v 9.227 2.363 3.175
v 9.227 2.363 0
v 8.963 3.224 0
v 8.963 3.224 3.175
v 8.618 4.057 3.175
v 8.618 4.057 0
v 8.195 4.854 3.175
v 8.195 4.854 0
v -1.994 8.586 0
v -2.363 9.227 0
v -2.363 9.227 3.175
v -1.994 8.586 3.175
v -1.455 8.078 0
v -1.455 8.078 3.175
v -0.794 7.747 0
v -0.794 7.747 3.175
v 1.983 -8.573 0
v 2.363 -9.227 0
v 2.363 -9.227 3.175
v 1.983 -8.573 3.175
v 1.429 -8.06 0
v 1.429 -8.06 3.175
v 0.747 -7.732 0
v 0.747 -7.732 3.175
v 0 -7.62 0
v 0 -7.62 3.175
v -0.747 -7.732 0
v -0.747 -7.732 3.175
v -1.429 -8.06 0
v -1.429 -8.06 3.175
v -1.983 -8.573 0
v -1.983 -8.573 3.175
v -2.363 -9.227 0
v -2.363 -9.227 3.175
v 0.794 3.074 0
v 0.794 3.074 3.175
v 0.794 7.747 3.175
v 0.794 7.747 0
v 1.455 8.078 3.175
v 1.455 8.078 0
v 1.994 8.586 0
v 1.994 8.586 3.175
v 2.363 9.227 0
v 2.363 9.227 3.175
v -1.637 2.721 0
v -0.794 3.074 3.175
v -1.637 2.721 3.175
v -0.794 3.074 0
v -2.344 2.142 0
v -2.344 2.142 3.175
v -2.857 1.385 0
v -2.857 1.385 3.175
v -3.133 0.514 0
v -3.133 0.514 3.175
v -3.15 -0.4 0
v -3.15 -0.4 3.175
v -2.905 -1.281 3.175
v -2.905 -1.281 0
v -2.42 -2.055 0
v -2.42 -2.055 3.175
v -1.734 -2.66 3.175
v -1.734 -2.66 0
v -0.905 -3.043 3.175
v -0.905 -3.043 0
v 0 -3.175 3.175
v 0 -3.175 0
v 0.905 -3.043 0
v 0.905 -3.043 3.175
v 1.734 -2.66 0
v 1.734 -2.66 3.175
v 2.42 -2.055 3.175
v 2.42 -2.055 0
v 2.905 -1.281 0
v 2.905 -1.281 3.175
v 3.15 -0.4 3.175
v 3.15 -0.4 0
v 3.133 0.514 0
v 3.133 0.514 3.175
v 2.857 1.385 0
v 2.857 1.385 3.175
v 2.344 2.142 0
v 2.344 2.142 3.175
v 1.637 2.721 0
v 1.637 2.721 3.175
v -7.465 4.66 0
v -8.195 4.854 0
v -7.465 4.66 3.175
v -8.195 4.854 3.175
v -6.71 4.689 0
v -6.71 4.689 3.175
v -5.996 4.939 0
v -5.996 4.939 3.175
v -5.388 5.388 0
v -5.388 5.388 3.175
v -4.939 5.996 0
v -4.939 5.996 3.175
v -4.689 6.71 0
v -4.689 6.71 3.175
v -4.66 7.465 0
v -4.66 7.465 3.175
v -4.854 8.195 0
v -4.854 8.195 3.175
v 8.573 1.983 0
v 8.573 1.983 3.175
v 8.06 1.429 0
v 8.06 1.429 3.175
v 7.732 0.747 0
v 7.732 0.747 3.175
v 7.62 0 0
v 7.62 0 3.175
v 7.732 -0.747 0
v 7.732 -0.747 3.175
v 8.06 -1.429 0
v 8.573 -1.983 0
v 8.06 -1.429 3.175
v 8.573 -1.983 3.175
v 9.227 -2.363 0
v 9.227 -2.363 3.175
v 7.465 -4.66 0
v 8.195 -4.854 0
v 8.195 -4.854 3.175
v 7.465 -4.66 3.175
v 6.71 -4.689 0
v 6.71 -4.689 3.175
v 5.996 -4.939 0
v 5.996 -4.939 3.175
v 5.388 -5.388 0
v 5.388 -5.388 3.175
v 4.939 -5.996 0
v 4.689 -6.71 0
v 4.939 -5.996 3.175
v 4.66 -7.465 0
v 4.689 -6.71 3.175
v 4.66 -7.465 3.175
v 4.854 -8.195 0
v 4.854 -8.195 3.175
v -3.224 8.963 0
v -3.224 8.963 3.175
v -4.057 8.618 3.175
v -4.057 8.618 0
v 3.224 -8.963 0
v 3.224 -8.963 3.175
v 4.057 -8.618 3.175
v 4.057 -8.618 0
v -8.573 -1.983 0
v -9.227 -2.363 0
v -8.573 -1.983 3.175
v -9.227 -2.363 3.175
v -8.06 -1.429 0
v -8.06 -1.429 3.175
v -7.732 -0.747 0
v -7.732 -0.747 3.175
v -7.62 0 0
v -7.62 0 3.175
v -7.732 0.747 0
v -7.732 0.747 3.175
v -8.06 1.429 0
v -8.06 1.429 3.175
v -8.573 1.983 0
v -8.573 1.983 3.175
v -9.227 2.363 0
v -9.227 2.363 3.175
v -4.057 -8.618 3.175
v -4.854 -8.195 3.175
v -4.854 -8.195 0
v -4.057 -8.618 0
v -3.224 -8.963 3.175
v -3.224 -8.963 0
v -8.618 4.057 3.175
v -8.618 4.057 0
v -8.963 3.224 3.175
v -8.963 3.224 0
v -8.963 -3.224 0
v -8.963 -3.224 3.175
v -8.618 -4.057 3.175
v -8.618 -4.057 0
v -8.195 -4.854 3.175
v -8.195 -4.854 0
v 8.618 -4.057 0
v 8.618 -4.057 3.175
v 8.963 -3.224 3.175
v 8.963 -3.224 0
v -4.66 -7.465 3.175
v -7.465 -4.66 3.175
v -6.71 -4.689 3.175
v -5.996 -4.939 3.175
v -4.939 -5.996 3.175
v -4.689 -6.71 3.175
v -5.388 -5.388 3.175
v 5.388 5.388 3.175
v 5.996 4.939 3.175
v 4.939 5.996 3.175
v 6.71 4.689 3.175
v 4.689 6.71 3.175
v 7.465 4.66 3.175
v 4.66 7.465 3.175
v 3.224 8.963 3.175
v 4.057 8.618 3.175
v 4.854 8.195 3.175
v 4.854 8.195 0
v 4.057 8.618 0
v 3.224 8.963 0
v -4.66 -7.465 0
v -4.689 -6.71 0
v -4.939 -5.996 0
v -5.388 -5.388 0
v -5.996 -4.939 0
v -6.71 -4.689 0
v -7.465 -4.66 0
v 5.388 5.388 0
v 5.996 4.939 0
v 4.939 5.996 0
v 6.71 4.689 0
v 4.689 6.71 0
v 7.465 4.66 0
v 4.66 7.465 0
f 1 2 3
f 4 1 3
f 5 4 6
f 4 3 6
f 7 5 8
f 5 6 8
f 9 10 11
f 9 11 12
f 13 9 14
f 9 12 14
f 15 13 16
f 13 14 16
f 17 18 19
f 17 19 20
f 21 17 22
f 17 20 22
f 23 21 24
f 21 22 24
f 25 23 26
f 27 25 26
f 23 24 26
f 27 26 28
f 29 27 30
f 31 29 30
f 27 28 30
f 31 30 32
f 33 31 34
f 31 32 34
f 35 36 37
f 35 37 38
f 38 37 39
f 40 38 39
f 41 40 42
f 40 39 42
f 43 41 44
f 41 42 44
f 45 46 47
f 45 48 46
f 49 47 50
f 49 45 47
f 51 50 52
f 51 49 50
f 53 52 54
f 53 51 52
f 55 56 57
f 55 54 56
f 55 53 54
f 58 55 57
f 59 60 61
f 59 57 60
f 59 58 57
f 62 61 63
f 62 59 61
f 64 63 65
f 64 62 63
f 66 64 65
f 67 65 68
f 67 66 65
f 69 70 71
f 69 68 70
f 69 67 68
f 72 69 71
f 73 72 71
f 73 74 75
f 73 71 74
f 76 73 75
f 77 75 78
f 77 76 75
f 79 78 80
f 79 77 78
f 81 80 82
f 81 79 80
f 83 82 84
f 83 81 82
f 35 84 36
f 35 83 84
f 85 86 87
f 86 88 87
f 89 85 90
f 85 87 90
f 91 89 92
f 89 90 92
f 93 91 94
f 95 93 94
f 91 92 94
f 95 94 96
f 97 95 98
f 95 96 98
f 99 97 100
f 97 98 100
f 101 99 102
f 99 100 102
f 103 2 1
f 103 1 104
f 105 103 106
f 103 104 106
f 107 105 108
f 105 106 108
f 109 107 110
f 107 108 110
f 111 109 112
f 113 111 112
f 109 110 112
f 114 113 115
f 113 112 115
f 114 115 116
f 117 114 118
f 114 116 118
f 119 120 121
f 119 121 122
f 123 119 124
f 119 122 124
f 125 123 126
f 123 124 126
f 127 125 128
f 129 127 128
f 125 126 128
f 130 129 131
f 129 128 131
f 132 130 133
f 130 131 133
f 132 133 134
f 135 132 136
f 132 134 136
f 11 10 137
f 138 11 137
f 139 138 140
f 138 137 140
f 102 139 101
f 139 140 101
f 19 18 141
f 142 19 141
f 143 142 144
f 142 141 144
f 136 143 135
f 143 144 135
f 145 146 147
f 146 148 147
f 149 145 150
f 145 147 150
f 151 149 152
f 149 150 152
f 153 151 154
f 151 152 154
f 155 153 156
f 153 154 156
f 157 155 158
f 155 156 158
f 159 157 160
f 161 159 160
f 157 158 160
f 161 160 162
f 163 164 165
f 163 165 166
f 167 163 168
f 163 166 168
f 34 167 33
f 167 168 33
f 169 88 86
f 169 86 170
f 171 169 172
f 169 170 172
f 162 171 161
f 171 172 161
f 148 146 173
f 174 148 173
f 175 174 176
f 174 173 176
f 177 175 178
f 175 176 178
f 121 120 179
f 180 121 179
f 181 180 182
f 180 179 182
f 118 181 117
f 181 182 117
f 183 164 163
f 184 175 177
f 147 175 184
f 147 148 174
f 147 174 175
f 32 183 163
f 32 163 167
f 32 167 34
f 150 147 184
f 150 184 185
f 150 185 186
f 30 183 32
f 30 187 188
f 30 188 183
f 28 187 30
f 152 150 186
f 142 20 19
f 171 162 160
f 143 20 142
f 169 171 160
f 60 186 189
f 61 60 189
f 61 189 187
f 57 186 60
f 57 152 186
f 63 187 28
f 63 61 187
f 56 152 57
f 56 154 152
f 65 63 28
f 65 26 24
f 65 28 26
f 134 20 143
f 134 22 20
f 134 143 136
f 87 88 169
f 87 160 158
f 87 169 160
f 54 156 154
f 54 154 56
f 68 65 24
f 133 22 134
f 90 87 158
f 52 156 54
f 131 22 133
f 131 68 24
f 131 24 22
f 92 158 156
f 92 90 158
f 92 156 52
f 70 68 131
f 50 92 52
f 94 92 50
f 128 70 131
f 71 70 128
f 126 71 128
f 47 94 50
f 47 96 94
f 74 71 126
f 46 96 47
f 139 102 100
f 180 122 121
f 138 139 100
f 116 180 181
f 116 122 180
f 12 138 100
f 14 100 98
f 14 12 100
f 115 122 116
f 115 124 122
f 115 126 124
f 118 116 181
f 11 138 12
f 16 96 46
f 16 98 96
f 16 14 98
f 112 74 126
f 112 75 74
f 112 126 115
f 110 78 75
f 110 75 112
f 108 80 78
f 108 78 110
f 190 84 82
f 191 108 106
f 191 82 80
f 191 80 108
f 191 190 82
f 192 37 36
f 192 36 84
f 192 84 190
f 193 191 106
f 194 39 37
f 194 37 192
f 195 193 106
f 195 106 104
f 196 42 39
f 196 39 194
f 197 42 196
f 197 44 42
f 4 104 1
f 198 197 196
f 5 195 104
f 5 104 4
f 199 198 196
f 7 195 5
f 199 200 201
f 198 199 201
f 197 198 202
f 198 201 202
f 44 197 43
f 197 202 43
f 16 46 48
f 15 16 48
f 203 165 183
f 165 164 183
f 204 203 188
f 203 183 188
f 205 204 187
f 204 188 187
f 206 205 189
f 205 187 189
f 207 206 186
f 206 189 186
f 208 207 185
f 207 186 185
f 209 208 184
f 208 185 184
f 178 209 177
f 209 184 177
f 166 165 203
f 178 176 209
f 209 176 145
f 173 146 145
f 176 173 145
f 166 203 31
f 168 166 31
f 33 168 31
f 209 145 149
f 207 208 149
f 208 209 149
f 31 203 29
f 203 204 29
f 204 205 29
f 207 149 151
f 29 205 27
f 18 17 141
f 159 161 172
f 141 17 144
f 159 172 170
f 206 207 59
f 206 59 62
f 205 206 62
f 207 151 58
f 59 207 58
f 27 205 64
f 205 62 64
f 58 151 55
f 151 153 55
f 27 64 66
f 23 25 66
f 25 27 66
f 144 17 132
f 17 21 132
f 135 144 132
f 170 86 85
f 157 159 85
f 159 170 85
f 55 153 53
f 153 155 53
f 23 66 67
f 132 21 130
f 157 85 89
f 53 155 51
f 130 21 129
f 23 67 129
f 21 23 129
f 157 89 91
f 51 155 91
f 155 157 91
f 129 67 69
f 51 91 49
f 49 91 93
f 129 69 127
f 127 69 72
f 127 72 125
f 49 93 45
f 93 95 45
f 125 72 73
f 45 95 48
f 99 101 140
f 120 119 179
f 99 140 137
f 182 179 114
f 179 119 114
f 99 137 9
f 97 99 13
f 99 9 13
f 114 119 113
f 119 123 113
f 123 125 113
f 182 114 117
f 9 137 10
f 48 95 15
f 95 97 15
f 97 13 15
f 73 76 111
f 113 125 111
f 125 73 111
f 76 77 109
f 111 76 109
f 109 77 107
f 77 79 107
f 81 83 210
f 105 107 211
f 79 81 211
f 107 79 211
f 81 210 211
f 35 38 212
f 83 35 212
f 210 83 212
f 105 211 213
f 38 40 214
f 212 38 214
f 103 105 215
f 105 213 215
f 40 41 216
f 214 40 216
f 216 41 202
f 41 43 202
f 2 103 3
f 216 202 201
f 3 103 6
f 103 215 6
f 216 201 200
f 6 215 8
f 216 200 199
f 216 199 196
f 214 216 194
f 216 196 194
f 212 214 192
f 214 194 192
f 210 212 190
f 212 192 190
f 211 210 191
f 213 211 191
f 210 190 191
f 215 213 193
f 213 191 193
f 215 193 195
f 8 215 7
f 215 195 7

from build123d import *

# Parameters (mm, degrees)
CROQUIS1_R              = 9.525
CROQUIS1_R_2            = 3.175
SALIENTE_EXTRUIR1_DEPTH = 3.175
CROQUIS2_R              = 2.54
CORTAR_EXTRUIR1_DEPTH   = 3.175
CROQUIS3_W              = 1.5875
CROQUIS3_H              = 3.175
CORTAR_EXTRUIR2_DEPTH   = 14.430129201


with BuildPart() as part:
    # Croquis1 → Saliente-Extruir1 (new body)
    with BuildSketch(Plane.XY):
        Circle(CROQUIS1_R)
        Circle(CROQUIS1_R_2, mode=Mode.SUBTRACT)
    extrude(amount=SALIENTE_EXTRUIR1_DEPTH)

    # Croquis2 → Cortar-Extruir1 (cut)
    with BuildSketch(Plane.XY.offset(3.175)):
        with Locations((-10.16, 0)):
            Circle(CROQUIS2_R)
        with Locations((-7.184204897, 7.184204897)):
            Circle(CROQUIS2_R)
        with Locations((0, 10.16)):
            Circle(CROQUIS2_R)
        with Locations((7.184204897, 7.184204897)):
            Circle(CROQUIS2_R)
        with Locations((10.16, 0)):
            Circle(CROQUIS2_R)
        with Locations((7.184204897, -7.184204897)):
            Circle(CROQUIS2_R)
        with Locations((0, -10.16)):
            Circle(CROQUIS2_R)
        with Locations((-7.184204897, -7.184204897)):
            Circle(CROQUIS2_R)
    extrude(amount=-CORTAR_EXTRUIR1_DEPTH, mode=Mode.SUBTRACT)

    # Croquis3 → Cortar-Extruir2 (cut, through all)
    with BuildSketch(Plane(origin=(0, 0, 0), x_dir=(1, 0, 0), z_dir=(0, 1, 0))):
        with Locations((0, -1.5875)):
            Rectangle(CROQUIS3_W, CROQUIS3_H)
    extrude(amount=CORTAR_EXTRUIR2_DEPTH, mode=Mode.SUBTRACT)


solid = part.part
